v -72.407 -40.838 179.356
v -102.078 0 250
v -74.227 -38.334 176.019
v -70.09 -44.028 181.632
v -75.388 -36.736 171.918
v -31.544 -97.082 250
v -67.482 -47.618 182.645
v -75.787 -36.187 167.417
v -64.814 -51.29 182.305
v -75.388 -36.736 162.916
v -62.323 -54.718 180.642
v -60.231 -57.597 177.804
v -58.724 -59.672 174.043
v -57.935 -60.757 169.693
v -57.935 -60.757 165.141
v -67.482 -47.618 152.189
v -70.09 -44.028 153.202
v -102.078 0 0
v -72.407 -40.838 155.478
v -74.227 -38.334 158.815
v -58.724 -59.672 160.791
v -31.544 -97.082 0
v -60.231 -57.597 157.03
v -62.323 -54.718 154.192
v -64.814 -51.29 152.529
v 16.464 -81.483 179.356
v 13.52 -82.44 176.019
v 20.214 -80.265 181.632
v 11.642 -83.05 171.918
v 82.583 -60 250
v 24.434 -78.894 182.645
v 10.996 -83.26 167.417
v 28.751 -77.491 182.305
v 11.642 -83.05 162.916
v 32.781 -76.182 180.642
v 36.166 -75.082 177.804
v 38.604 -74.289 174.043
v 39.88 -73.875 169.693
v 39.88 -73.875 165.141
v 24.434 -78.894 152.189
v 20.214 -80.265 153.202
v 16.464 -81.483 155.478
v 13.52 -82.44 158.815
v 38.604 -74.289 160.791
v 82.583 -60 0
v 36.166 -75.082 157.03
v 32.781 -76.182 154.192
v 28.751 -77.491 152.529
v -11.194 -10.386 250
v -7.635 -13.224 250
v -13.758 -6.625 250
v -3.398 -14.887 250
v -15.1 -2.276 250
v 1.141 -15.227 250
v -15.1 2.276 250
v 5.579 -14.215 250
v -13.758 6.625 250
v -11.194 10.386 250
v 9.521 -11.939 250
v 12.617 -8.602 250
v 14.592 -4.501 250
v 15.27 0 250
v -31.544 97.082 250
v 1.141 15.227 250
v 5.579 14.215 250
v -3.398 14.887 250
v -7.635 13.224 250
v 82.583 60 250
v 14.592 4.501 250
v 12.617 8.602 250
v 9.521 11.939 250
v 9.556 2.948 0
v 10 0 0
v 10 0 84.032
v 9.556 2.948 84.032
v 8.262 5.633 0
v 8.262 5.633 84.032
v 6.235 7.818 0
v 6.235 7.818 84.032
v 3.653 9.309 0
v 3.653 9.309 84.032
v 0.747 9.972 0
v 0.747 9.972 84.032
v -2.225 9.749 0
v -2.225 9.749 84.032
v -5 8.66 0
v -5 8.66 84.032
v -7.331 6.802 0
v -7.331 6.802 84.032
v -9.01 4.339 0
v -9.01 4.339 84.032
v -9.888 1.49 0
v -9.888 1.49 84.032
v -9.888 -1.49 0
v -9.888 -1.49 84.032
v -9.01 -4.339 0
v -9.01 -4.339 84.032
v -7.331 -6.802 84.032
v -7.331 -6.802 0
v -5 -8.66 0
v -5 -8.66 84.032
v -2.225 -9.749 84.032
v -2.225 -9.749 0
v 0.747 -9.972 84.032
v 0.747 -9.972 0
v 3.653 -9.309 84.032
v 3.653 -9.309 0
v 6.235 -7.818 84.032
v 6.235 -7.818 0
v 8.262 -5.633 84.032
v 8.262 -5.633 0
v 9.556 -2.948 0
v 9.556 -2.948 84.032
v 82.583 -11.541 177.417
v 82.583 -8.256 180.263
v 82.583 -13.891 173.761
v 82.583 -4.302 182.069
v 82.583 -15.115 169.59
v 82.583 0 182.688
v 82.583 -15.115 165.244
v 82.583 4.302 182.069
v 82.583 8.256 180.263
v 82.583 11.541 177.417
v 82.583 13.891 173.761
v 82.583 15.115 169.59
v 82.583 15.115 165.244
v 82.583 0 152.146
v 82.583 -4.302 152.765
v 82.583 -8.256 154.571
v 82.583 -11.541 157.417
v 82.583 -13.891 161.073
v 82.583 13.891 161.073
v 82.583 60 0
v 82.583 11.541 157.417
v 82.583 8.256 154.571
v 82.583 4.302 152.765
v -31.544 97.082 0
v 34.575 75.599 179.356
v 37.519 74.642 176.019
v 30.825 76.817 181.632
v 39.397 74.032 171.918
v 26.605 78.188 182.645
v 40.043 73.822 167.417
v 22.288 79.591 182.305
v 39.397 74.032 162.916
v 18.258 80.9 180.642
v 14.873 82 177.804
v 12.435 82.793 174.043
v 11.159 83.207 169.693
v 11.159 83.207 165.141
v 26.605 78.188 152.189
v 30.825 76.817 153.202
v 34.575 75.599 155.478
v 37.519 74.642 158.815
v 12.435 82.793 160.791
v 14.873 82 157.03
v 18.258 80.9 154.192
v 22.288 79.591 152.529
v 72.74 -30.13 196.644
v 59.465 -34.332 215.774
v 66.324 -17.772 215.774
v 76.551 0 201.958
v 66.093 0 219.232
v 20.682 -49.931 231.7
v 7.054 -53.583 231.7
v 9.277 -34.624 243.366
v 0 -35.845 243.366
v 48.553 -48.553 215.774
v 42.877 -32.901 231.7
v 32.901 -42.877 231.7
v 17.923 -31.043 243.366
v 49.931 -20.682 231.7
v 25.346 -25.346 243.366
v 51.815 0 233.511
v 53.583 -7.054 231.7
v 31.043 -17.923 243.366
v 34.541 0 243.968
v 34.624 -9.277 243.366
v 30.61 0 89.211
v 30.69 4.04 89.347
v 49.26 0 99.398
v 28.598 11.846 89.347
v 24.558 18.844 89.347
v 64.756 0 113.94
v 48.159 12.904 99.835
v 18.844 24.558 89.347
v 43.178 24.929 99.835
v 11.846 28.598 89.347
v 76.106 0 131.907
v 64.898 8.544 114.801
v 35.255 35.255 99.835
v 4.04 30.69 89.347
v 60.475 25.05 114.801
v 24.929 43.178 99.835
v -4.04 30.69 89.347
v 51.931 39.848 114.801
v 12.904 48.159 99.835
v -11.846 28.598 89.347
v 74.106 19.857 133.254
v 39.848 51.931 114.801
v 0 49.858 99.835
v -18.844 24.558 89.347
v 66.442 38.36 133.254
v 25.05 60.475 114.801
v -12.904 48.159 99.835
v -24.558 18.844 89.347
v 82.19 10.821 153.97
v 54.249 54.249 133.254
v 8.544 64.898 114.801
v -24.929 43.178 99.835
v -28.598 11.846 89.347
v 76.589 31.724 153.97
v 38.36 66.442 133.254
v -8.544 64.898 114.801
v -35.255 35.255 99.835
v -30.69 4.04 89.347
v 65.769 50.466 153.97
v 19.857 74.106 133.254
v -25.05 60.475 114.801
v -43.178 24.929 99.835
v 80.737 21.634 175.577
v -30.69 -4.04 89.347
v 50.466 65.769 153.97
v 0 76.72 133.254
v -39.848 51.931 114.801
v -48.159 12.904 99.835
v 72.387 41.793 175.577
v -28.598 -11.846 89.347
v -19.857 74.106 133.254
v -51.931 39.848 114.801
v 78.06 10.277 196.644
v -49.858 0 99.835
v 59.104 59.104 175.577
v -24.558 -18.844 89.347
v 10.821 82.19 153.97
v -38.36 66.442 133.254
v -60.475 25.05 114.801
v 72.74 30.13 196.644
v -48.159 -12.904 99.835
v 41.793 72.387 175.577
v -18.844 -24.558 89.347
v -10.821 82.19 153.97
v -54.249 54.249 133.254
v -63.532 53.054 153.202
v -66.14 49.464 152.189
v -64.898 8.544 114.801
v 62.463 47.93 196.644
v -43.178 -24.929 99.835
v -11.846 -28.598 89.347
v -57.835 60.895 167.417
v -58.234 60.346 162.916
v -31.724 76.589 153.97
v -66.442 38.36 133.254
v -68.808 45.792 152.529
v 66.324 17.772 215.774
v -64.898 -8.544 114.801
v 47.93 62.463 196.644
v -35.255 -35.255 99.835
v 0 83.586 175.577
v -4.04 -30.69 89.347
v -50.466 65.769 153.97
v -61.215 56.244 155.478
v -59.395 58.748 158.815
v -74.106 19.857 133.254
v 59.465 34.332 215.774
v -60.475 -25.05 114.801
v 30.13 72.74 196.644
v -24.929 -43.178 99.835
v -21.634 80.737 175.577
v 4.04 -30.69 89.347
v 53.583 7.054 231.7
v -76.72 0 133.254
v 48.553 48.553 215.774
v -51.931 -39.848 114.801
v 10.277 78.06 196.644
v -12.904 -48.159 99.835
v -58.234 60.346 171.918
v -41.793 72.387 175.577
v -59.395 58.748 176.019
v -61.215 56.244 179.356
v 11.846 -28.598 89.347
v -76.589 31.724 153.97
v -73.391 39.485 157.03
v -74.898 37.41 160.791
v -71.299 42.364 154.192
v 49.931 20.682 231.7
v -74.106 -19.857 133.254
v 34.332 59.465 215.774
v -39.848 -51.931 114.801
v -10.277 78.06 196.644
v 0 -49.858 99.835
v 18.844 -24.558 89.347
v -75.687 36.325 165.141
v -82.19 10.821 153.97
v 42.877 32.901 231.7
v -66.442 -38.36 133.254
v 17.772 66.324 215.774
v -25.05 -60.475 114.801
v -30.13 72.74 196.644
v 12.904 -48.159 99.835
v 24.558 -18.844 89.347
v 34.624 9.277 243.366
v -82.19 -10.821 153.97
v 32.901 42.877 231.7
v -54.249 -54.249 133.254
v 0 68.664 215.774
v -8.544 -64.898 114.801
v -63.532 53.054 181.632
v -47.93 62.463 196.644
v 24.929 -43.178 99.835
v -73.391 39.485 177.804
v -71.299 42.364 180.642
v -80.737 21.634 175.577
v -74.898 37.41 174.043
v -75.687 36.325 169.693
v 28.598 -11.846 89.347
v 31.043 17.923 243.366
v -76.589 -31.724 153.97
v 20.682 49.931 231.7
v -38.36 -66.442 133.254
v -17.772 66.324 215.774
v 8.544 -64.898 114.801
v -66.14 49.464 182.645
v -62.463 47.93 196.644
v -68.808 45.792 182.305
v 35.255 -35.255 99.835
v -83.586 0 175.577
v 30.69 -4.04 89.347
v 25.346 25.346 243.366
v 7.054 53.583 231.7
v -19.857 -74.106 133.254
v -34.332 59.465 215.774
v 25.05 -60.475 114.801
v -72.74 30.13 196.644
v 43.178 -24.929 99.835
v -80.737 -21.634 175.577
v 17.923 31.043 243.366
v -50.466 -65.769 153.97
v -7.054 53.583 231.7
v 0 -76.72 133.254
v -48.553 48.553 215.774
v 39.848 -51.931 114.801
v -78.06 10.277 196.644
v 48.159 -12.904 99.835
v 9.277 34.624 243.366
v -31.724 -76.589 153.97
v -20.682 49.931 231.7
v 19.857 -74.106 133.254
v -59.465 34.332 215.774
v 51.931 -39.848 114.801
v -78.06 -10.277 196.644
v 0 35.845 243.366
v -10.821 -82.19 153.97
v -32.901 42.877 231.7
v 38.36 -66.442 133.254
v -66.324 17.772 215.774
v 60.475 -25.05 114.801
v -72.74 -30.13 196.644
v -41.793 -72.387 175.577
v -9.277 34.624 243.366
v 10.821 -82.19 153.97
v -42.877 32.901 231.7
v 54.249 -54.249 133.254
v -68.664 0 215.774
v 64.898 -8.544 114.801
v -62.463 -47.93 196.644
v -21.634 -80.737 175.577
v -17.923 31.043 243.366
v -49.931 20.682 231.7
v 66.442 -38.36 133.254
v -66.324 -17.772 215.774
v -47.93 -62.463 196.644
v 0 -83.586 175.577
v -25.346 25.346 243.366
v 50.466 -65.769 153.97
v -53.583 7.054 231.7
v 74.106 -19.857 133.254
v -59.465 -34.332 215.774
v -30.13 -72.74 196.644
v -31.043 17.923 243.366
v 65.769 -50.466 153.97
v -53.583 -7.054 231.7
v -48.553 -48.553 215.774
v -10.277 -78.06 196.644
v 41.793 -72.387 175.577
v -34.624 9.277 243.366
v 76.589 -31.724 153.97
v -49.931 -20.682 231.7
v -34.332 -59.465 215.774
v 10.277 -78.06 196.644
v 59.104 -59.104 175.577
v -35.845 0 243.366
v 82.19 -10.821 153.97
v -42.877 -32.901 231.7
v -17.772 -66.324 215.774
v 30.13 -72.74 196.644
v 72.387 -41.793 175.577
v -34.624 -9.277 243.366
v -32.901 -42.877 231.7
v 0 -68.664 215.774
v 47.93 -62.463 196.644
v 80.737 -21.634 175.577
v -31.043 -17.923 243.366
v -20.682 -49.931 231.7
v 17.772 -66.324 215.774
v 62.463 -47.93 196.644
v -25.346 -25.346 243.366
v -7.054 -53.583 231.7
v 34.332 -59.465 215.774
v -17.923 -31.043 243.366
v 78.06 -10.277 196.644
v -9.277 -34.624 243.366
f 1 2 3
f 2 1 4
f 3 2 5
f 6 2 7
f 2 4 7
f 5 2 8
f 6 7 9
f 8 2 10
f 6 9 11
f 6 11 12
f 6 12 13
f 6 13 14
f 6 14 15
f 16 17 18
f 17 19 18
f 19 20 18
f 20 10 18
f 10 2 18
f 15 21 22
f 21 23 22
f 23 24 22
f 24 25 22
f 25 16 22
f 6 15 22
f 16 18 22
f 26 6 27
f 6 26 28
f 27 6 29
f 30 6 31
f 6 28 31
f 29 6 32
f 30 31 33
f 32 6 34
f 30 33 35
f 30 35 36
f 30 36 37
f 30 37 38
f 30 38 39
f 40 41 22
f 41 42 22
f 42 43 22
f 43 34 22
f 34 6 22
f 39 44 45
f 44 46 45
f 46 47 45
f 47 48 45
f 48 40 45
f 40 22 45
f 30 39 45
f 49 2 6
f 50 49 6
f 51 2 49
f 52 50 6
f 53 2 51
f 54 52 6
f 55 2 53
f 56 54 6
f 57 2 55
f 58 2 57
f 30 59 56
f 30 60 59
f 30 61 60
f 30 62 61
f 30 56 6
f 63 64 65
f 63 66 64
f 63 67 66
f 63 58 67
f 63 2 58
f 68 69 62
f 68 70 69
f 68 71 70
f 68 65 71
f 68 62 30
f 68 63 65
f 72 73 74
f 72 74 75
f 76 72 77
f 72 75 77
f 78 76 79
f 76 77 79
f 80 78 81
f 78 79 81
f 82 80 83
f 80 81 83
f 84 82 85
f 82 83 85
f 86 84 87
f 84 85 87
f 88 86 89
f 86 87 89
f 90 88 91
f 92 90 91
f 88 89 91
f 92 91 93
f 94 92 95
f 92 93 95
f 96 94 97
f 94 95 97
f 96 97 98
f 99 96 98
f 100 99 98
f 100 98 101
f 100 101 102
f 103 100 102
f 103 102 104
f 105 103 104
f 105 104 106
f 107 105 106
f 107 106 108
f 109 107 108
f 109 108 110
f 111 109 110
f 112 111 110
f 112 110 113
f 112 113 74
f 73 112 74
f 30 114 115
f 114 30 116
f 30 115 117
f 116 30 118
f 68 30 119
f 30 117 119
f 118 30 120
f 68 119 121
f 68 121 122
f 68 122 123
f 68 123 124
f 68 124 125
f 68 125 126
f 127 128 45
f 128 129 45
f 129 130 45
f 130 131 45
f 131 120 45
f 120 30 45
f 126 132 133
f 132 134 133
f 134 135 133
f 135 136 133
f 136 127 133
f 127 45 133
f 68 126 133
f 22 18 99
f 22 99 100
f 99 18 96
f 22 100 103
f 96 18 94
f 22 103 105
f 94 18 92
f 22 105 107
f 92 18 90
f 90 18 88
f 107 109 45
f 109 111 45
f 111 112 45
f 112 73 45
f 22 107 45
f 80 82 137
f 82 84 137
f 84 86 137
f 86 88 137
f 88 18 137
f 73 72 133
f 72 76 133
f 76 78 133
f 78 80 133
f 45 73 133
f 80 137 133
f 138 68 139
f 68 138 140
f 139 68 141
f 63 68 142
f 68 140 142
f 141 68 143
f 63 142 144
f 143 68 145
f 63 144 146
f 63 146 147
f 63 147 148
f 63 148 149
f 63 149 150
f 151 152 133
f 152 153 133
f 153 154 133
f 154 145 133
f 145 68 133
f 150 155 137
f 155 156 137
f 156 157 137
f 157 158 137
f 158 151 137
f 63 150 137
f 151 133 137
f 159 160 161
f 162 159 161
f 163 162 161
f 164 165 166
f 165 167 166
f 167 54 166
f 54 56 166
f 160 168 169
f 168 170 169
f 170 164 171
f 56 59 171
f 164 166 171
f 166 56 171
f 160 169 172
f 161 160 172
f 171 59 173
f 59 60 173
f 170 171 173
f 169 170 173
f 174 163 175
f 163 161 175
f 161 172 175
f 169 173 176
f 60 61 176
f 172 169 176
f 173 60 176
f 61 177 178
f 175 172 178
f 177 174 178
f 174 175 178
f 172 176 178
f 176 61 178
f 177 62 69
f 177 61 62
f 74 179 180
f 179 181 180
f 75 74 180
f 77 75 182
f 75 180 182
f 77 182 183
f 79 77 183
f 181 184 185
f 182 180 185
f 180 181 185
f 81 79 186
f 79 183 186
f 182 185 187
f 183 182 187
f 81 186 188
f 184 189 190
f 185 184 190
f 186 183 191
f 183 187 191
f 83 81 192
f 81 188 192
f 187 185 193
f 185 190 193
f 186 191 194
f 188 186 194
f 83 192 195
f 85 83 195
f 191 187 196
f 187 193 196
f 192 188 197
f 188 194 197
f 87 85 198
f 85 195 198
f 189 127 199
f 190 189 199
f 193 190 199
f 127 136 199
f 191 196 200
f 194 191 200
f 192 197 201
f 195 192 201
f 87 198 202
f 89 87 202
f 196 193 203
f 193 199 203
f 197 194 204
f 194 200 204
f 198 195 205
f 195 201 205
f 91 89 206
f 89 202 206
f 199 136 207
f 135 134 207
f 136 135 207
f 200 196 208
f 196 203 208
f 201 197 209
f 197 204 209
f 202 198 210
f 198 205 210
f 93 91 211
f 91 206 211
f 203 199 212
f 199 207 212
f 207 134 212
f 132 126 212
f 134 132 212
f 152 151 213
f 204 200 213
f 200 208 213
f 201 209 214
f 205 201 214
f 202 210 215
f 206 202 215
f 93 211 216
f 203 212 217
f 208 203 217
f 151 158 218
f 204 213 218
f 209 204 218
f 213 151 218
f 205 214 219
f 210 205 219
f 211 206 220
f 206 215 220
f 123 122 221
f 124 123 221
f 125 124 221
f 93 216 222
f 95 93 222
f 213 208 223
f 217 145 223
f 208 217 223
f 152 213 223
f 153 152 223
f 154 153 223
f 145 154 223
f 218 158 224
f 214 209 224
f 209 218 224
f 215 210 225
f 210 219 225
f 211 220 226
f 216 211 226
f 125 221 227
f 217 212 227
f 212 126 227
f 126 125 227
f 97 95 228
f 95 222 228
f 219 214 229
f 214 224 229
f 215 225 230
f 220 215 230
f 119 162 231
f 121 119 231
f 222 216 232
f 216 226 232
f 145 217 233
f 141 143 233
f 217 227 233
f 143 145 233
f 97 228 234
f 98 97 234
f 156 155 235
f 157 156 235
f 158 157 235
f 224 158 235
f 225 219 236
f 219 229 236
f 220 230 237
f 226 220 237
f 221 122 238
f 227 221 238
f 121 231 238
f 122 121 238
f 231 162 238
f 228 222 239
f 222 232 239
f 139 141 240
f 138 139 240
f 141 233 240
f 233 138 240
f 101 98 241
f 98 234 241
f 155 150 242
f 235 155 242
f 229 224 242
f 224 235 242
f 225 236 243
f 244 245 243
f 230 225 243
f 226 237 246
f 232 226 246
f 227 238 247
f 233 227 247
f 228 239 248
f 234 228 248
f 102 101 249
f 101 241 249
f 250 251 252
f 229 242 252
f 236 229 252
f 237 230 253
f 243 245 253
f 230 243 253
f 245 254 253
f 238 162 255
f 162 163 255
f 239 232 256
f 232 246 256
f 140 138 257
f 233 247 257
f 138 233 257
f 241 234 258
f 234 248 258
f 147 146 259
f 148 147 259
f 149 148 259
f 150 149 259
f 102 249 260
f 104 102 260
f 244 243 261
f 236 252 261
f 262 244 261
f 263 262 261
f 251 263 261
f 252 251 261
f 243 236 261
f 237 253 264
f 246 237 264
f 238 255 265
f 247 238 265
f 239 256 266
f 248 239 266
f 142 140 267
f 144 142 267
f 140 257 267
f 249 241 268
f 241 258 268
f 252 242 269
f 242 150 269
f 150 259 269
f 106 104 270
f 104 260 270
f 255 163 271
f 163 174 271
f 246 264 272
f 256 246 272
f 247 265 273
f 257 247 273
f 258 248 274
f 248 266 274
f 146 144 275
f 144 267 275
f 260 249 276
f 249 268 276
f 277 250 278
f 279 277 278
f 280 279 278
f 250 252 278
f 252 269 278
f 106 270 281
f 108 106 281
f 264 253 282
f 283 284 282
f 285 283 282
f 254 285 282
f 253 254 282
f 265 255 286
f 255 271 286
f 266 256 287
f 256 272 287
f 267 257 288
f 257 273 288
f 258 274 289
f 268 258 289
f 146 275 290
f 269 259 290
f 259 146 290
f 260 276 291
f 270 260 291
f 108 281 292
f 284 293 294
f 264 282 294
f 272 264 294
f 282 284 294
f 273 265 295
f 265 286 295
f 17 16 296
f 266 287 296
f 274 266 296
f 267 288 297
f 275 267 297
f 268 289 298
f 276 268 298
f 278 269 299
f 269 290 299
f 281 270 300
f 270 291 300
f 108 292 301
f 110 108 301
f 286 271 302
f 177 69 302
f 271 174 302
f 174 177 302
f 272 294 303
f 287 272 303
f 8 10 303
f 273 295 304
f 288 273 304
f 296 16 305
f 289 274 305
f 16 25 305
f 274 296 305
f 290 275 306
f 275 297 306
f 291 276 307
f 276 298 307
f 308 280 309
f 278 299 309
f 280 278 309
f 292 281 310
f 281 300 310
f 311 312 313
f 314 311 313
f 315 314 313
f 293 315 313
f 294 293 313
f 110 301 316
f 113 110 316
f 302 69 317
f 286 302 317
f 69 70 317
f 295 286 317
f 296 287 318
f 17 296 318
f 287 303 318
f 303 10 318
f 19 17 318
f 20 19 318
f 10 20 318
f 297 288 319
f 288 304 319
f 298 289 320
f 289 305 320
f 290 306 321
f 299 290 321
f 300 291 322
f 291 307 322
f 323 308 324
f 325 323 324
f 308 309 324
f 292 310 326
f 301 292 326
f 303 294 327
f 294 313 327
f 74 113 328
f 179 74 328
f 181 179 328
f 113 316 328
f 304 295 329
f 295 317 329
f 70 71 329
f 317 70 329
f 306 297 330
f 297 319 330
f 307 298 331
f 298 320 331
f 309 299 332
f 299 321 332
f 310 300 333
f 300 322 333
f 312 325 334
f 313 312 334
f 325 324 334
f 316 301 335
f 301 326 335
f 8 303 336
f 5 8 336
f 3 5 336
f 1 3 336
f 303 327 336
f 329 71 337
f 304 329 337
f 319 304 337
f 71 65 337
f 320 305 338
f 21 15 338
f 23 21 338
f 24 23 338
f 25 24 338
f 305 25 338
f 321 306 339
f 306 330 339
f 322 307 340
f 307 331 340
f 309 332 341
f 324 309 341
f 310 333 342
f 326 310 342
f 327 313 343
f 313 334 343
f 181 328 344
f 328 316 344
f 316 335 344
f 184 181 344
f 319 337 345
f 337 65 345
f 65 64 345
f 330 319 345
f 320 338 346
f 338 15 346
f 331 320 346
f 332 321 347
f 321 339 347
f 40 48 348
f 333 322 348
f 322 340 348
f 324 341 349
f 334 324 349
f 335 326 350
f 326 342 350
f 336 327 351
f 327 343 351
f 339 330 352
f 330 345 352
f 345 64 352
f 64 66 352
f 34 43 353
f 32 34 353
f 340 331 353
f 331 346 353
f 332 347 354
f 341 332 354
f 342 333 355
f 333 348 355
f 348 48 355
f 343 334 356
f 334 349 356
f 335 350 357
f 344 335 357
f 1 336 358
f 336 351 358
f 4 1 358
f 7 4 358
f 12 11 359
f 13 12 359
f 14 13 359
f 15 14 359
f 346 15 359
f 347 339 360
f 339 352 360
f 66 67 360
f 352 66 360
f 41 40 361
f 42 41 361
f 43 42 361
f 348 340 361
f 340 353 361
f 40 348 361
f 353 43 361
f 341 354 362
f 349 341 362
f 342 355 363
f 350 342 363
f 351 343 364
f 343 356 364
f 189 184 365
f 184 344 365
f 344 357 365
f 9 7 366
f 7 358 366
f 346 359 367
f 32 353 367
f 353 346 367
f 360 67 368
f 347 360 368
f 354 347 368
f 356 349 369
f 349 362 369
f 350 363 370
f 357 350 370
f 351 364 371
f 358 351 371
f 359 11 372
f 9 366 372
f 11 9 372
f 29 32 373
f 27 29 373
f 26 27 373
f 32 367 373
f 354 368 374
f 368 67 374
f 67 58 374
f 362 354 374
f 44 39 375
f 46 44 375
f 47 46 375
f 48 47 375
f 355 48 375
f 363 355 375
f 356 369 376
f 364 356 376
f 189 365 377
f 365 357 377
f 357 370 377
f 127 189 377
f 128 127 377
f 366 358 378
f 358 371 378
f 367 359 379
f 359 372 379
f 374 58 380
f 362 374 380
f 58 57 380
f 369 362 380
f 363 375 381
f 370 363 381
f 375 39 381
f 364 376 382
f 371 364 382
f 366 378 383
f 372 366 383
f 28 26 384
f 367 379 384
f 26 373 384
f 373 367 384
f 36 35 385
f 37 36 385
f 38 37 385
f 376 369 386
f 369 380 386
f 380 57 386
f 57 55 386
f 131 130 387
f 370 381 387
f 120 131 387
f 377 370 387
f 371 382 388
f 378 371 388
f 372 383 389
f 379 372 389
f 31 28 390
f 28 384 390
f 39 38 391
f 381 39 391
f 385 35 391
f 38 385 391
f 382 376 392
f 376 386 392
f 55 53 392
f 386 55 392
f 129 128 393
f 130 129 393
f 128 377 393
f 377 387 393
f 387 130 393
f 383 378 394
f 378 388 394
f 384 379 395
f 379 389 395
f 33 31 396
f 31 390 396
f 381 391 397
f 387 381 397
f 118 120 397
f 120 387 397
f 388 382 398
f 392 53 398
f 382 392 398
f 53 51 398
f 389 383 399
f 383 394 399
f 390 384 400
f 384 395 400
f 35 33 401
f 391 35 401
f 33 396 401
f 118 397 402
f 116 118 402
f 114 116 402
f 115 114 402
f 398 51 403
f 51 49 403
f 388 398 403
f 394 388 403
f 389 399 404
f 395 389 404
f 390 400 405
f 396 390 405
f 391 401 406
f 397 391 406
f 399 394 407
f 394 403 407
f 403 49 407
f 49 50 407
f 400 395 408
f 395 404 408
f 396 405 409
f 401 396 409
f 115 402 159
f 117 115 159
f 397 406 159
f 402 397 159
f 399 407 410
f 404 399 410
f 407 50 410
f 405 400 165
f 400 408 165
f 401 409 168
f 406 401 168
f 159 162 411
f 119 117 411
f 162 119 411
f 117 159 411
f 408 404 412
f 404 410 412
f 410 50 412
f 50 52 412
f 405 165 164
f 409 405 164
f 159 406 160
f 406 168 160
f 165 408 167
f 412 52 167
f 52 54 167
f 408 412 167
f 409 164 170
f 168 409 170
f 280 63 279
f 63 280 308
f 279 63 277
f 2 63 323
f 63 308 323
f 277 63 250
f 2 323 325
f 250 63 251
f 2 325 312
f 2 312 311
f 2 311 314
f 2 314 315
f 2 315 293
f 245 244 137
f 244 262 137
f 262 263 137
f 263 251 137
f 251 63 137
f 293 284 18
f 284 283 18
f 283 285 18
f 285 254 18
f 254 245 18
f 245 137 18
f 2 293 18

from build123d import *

# Parameters (mm, degrees)
PAD_DEPTH    = 250
SKETCH001_R  = 10
POCKET_DEPTH = 250.001


with BuildPart() as sph_re:
    # Sphere → Sphere (revolve)
    with BuildSketch(Plane(origin=(0, 0, 167.417), x_dir=(1, 0, 0), z_dir=(0, -1, 0))):
        with BuildLine():
            ThreePointArc((0, -83.9829), (83.9829, 0), (0, 83.9829))
            Line((0, 83.9829), (0, -83.9829))
        make_face()
    revolve(axis=Axis((0, 0, 167.417), (0, 0, 1)))


with BuildPart() as cut:
    # Sketch → Pad (new body)
    with BuildSketch(Plane.XY):
        Polygon((-31.543867, 97.082039), (-102.078097, 0), (-31.543867, -97.082039), (82.582915, -60), (82.582915, 60), align=None)
    extrude(amount=PAD_DEPTH)

    # Sketch001 → Pocket (cut, through all)
    with BuildSketch(Plane.XY.offset(250)):
        Circle(SKETCH001_R)
    extrude(amount=-POCKET_DEPTH, mode=Mode.SUBTRACT)

    # Cut: cut Sphère
    add(sph_re.part, mode=Mode.SUBTRACT)


solid = cut.part
